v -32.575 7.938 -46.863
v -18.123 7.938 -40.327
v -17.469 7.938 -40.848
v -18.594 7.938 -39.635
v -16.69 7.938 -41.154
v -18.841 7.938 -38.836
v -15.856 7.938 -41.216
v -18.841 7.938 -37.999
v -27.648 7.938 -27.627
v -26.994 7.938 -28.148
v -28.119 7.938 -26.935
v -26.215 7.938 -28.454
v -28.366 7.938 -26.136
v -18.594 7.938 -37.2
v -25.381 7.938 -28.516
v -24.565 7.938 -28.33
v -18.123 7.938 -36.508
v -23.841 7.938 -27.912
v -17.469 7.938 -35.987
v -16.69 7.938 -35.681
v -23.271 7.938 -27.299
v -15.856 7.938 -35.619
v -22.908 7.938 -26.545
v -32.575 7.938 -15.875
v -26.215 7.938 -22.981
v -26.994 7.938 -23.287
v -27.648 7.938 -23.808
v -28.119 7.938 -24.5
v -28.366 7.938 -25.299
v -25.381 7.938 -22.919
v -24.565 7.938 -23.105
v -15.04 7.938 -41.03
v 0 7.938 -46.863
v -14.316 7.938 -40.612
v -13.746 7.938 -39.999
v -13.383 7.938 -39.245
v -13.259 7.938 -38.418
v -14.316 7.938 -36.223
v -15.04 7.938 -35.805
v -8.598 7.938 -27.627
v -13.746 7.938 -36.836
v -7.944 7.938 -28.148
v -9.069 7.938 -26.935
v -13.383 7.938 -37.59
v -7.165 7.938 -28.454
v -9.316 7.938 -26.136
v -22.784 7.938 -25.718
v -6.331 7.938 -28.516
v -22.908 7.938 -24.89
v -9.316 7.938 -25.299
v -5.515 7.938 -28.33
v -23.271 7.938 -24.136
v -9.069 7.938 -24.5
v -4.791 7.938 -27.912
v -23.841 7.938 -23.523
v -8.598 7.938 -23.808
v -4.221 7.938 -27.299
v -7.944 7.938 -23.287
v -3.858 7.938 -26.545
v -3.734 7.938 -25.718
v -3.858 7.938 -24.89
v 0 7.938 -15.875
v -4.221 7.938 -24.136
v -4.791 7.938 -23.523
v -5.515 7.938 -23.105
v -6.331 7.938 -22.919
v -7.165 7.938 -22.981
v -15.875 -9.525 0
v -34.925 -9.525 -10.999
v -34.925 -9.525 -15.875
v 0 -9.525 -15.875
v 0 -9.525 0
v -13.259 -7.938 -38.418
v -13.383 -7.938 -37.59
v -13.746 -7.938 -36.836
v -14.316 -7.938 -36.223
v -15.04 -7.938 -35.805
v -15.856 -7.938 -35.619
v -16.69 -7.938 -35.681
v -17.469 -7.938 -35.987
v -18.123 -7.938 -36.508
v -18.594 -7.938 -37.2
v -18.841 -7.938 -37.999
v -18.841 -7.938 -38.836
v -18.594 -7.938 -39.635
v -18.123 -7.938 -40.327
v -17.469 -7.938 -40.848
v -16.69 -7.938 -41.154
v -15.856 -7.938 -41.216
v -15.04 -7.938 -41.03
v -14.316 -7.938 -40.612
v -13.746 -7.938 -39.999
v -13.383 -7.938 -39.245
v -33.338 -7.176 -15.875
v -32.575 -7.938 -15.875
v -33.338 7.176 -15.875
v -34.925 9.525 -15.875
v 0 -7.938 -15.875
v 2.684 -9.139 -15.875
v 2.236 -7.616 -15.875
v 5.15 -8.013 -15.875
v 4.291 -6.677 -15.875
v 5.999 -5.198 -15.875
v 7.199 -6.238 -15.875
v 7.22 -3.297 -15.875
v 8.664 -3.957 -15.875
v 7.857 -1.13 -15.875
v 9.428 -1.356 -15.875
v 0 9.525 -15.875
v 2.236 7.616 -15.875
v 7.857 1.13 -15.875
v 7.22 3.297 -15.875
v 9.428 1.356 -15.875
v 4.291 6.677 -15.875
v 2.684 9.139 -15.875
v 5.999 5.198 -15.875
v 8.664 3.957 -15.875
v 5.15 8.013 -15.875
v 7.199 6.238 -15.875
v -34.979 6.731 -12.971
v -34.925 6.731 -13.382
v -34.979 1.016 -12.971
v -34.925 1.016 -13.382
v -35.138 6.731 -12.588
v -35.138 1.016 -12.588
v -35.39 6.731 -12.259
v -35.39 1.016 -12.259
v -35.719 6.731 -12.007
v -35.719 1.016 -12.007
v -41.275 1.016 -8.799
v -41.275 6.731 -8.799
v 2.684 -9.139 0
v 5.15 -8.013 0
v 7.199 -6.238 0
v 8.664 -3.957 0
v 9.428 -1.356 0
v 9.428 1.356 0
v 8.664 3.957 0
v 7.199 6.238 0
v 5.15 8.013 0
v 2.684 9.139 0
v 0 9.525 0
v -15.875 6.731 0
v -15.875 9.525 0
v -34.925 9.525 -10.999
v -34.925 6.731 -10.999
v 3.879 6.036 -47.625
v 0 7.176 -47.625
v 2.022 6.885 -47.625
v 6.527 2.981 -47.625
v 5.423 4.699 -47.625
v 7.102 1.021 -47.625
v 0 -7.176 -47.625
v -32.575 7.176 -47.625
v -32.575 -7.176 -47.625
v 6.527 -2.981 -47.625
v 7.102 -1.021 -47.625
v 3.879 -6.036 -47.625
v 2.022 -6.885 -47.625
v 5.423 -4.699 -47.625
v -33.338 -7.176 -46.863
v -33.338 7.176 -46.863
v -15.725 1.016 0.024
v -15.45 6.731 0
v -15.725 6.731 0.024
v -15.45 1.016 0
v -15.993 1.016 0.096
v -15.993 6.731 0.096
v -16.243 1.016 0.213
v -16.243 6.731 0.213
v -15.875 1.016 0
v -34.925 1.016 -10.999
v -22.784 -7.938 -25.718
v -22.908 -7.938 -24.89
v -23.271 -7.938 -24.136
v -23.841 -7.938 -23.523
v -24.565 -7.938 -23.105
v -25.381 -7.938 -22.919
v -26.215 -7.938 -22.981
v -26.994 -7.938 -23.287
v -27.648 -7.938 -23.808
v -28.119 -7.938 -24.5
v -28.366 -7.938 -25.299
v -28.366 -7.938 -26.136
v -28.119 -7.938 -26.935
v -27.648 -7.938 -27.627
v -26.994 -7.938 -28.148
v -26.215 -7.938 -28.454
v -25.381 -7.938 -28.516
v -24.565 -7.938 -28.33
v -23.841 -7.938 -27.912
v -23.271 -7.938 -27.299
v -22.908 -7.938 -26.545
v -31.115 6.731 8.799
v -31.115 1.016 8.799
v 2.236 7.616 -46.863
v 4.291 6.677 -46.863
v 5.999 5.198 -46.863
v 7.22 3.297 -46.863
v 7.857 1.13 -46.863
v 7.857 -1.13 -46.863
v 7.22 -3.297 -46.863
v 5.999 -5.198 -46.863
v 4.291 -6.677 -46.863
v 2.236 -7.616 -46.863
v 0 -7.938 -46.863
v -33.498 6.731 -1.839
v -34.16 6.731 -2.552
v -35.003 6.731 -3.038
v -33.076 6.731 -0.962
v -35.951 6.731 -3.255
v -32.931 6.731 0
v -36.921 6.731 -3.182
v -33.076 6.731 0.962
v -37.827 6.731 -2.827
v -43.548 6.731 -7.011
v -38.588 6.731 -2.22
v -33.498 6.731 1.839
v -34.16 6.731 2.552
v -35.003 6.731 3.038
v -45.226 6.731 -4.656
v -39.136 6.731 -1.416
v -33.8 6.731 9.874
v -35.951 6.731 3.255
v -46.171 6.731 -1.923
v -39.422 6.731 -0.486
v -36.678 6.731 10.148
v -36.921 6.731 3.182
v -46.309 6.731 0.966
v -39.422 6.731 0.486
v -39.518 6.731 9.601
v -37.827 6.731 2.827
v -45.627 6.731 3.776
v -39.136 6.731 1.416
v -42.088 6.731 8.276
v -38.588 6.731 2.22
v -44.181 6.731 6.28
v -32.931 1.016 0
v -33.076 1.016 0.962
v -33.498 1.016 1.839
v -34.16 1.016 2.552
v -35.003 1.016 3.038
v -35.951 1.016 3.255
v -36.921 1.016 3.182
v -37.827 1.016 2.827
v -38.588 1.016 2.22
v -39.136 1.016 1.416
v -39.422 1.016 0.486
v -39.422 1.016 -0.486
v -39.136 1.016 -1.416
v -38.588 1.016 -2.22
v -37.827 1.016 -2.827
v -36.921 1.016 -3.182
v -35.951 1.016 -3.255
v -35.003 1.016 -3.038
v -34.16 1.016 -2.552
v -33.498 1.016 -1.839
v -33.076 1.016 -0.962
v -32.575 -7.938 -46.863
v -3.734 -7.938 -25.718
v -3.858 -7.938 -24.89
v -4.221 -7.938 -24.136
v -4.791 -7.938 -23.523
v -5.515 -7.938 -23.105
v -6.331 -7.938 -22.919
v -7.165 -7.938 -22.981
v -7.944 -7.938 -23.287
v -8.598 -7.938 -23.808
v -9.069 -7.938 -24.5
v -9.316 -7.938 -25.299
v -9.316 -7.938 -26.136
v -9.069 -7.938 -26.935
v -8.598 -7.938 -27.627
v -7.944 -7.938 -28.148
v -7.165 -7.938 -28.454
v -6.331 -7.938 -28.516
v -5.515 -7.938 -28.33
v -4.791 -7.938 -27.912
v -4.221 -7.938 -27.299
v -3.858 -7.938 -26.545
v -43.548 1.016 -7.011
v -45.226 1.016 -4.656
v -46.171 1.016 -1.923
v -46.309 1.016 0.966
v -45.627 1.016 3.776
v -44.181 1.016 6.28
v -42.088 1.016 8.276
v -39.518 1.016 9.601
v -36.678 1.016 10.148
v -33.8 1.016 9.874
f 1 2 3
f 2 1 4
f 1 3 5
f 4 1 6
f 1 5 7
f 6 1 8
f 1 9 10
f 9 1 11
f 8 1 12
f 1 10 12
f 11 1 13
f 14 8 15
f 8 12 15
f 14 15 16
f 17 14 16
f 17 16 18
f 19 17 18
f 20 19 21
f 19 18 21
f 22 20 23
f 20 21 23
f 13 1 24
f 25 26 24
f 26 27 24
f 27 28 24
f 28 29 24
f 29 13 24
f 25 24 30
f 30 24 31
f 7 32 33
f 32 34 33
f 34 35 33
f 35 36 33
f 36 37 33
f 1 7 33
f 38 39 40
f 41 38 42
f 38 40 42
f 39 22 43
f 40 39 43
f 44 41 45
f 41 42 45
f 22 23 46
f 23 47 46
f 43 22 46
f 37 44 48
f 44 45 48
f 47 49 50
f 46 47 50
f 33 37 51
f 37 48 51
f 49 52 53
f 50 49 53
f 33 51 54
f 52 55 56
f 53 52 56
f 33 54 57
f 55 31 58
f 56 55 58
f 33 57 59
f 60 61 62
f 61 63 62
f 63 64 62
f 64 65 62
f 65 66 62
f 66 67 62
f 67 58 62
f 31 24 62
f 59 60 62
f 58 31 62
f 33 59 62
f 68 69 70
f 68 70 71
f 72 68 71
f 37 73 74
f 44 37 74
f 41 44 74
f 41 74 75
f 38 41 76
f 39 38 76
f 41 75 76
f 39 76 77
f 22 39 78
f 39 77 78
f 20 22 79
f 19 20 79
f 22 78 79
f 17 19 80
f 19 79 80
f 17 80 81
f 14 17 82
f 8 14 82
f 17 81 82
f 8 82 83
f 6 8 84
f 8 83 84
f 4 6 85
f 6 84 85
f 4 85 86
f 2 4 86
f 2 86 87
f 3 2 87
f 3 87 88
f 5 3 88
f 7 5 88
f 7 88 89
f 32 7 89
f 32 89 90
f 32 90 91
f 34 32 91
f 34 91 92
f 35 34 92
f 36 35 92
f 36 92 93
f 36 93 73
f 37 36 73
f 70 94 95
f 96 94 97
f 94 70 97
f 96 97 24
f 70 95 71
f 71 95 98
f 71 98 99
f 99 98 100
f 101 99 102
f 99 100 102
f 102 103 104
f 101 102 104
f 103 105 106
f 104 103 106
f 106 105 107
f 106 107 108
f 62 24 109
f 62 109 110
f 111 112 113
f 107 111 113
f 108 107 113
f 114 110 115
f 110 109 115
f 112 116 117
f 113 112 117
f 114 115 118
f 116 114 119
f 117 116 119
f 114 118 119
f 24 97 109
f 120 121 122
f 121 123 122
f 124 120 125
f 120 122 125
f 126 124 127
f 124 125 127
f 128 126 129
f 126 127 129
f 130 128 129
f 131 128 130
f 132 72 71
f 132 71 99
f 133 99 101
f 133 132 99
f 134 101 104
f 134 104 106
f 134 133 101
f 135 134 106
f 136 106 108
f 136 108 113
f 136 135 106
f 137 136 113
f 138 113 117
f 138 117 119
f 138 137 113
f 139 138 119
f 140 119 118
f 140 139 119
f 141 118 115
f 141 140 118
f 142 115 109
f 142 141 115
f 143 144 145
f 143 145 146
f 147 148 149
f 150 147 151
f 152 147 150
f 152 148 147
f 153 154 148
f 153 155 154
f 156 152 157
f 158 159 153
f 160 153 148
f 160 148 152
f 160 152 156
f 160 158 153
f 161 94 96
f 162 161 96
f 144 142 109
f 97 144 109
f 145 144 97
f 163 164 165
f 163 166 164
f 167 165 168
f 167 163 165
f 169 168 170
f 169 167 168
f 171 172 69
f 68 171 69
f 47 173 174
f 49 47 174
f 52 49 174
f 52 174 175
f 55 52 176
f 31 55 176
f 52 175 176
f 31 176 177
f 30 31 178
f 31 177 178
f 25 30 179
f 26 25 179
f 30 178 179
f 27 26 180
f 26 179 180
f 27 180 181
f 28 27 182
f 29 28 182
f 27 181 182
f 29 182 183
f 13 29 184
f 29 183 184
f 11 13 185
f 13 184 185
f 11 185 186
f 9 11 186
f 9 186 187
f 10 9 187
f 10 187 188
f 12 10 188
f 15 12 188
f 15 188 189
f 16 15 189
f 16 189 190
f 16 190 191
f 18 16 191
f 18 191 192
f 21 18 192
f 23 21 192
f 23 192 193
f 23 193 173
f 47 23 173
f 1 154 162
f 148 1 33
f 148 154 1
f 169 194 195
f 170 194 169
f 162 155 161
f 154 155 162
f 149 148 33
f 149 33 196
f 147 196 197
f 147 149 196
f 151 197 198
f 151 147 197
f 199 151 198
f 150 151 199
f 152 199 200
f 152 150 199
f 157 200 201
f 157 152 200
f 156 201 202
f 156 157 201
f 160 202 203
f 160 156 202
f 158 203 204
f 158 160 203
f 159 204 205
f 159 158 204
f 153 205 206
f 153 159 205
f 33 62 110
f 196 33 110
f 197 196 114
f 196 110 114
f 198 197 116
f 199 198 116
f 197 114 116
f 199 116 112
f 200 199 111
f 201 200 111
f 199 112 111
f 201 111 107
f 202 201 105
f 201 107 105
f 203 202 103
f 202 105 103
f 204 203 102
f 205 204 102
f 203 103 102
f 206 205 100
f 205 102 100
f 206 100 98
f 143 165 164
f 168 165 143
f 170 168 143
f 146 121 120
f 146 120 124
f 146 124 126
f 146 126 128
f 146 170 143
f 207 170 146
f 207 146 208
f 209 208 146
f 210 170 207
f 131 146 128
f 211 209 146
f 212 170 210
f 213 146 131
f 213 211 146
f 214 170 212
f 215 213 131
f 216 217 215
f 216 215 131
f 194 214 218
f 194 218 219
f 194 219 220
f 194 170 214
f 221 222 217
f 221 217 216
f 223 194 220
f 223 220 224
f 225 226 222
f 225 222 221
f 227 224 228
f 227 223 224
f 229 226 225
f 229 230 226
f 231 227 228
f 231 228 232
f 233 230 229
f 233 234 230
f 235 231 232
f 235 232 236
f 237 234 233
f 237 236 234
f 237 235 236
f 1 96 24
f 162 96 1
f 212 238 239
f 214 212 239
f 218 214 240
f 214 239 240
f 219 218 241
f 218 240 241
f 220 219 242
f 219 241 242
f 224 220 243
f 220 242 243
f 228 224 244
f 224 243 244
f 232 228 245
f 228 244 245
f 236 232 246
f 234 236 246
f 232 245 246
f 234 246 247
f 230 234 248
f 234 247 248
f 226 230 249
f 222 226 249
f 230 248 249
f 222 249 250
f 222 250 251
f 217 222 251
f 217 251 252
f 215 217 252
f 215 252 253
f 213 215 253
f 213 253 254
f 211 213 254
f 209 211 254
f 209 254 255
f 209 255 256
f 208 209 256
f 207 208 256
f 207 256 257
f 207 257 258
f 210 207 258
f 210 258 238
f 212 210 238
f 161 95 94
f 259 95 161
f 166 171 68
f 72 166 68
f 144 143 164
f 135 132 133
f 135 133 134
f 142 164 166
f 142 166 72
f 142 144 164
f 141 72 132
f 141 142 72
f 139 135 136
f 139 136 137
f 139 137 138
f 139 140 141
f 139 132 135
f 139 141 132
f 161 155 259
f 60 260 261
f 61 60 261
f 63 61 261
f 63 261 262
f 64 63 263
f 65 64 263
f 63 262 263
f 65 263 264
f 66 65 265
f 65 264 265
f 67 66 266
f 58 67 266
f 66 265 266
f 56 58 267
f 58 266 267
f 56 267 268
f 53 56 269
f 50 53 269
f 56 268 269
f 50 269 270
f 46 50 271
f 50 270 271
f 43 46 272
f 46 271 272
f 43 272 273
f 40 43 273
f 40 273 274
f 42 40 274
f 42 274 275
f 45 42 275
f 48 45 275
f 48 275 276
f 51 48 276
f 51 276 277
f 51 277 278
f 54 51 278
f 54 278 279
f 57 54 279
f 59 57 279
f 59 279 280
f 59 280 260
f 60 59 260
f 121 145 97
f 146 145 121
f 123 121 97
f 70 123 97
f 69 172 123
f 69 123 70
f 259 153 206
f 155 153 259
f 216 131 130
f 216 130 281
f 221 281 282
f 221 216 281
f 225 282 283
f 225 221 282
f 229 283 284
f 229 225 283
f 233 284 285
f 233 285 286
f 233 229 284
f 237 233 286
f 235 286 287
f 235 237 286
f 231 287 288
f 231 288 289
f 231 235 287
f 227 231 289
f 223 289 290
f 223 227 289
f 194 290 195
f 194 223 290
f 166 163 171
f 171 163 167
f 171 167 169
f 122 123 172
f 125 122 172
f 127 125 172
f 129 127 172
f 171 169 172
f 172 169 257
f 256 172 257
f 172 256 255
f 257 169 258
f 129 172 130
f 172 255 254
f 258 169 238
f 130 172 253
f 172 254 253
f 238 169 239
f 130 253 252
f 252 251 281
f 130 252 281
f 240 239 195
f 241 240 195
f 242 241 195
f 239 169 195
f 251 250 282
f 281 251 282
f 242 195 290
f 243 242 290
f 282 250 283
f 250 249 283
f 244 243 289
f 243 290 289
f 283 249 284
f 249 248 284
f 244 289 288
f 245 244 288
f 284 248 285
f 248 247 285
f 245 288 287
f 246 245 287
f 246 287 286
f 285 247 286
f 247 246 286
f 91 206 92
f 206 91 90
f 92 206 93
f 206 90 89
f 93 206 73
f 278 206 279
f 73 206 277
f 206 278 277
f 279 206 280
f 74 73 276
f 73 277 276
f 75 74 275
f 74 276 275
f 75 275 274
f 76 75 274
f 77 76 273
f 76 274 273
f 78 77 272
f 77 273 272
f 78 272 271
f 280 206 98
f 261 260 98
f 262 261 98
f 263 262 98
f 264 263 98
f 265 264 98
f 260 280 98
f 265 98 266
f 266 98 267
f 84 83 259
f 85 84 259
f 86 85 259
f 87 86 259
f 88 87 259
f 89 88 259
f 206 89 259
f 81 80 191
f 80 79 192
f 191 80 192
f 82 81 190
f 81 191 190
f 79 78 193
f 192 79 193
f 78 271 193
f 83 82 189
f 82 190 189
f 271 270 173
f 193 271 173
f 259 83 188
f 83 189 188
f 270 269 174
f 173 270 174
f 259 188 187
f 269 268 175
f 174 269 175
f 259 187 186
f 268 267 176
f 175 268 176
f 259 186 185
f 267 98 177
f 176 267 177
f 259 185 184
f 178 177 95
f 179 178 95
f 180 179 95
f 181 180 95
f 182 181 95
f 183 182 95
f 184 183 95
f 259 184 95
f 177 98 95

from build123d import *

# Parameters (mm, degrees)
F1_DEPTH = 15.875
F3_DEPTH = 31.75
F4_SIZE2 = 10.9985226281
F4_SIZE  = 19.05
F6_START = -2.794
F6_DEPTH = 5.715
F8_D     = 6.5278
F9_SIZE  = 0.762
F11_D    = 5.6134
F12_R    = 1.5875


with BuildPart() as f1:
    # F0 (on Top) → F1 (new body)
    with BuildSketch(Plane.XY):
        with BuildLine():
            Line((0, 9.525), (-34.925, 9.525))
            Line((-34.925, 9.525), (-34.925, -9.525))
            Line((-34.925, -9.525), (0, -9.525))
            ThreePointArc((0, -9.525), (9.525, 0), (0, 9.525))
        make_face()
    extrude(amount=-F1_DEPTH)

    # F2 (on face) → F3 (join)
    with BuildSketch(Plane(origin=(0, 0, -15.875), x_dir=(1, 0, 0), z_dir=(0, 0, -1))):
        with BuildLine():
            Line((0, 7.9375), (-33.3375, 7.9375))
            Line((-33.3375, 7.9375), (-33.3375, -7.9375))
            Line((-33.3375, -7.9375), (0, -7.9375))
            ThreePointArc((0, -7.9375), (7.9375, 0), (0, 7.9375))
        make_face()
    extrude(amount=F3_DEPTH)

    # F4
    f4_edges = [f1.edges().sort_by_distance(p)[0] for p in [
        (-34.925, 0, 0),
    ]]
    f4_side = f1.faces().sort_by_distance((-13.668751, 0, 0))[0]
    chamfer(f4_edges, length=F4_SIZE, length2=F4_SIZE2, reference=f4_side)

    # F5 (on face) → F6 (join)
    with BuildSketch(Plane(origin=(0, 9.525, 0), x_dir=(-1, 0, 0), z_dir=(0, 1, 0)).offset(F6_START)):
        with BuildLine():
            Line((34.925, -12.4649923118), (41.275, -8.7988181024))
            ThreePointArc((41.275, -8.7988181024), (44.9938181024, 5.08), (31.115, 8.7988181024))
            Line((31.115, 8.7988181024), (15.875, 0))
            Line((15.875, 0), (34.925, -10.9985226281))
            Line((34.925, -10.9985226281), (34.925, -12.4649923118))
        make_face()
    extrude(amount=-F6_DEPTH)

    # F8 (through all)
    with Locations(Plane(origin=(0, 6.731, 0), x_dir=(-1, 0, 0), z_dir=(0, 1, 0))):
        with Locations((36.195, 0)):
            Hole(F8_D / 2)

    # F9
    f9_edges = [f1.edges().sort_by_distance(p)[0] for p in [
        (-16.66875, -7.9375, -47.625),
        (-33.3375, 0, -47.625),
        (-33.3375, -7.9375, -31.75),
        (-33.3375, 7.9375, -31.75),
        (7.9375, 0, -47.625),
        (-16.66875, 7.9375, -47.625),
    ]]
    chamfer(f9_edges, length=F9_SIZE)

    # F11 (through all)
    with Locations(Plane(origin=(0, 7.9375, 0), x_dir=(-1, 0, 0), z_dir=(0, 1, 0))):
        with Locations((25.5905, -25.7175), (6.5405, -25.7175), (16.0655, -38.4175)):
            Hole(F11_D / 2)

    # F12
    f12_edges = [f1.edges().sort_by_distance(p)[0] for p in [
        (-15.875, 3.8735, 0),
        (-34.925, 3.8735, -12.464992),
    ]]
    fillet(f12_edges, radius=F12_R)


solid = f1.part
